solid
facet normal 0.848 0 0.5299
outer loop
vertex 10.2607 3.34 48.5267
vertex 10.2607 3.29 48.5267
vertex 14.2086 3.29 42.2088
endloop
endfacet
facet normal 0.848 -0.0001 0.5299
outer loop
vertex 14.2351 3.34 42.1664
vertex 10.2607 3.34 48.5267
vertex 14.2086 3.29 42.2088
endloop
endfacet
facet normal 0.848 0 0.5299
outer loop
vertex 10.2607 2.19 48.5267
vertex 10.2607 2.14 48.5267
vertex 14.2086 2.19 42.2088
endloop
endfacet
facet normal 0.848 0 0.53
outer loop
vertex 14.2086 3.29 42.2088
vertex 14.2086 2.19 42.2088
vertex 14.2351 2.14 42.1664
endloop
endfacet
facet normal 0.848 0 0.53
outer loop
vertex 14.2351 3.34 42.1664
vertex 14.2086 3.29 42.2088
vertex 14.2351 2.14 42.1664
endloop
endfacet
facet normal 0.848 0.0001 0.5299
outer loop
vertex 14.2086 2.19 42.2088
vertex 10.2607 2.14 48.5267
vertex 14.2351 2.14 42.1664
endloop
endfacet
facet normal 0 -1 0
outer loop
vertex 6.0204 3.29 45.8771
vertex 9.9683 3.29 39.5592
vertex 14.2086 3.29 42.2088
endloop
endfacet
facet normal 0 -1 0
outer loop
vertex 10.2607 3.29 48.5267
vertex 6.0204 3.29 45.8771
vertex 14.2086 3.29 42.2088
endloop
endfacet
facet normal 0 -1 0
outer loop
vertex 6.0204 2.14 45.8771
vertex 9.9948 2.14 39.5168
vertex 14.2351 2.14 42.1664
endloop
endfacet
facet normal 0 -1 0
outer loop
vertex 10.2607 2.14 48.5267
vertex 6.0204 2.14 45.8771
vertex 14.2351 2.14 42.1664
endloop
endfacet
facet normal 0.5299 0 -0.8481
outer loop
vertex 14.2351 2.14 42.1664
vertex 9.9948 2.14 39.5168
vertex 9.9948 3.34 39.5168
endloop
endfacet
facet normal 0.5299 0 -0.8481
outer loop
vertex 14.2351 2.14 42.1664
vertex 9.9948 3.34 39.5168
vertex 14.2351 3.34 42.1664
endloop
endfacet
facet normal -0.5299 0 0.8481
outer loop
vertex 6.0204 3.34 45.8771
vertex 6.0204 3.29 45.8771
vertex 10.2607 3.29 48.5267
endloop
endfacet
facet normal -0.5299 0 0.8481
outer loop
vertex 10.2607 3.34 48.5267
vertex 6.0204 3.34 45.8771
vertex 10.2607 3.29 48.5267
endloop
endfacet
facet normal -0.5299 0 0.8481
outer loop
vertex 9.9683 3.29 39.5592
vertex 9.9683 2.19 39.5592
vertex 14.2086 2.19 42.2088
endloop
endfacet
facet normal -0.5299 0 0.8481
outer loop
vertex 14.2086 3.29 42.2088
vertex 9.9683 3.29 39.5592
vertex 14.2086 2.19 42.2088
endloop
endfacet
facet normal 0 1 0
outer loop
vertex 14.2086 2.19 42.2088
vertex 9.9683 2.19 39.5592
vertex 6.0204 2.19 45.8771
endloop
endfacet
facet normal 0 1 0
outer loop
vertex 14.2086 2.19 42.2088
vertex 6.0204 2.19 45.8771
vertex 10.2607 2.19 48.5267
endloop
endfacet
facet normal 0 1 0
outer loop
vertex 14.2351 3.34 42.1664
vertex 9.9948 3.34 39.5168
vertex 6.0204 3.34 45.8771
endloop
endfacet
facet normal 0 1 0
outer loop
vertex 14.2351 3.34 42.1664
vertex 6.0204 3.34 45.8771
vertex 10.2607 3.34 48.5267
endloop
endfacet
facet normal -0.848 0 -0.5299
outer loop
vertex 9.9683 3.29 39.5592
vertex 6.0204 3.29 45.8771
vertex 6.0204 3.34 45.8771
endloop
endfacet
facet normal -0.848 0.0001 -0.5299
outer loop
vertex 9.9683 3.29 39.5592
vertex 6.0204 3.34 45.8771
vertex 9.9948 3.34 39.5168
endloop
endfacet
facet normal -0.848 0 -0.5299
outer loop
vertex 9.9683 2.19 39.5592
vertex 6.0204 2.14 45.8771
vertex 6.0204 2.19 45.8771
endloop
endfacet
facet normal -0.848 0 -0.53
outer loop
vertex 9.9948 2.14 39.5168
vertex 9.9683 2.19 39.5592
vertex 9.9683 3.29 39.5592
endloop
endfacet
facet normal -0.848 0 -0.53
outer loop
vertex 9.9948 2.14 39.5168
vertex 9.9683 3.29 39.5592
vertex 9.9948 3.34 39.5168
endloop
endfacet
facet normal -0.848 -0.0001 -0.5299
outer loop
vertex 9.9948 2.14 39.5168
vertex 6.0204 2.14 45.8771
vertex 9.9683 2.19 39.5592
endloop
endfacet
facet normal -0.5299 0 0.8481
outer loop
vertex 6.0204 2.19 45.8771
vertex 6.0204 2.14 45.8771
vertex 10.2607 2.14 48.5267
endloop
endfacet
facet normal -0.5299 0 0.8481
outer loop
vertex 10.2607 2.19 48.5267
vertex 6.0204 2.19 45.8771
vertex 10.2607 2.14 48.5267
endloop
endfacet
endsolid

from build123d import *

# Parameters (mm, degrees)
BOX161_W           = 5
BOX161_H           = 7.45
BOX161_DEPTH       = 1.1
BOX160_W           = 5
BOX160_H           = 7.5
BOX160_DEPTH       = 1.2
CUT078_ROLL_ANGLE  = -90
CUT078_PITCH_ANGLE = -32


with BuildPart() as small_cu_gnd_electrode066:
    # Box161 → Box161 (new body)
    with BuildSketch(Plane.XY.offset(0.05)):
        with Locations((2.5, 3.725)):
            Rectangle(BOX161_W, BOX161_H)
    extrude(amount=BOX161_DEPTH)


with BuildPart() as small_cu_electrode001_long_axis_v007:
    # Box160 → Box160 (new body)
    with BuildSketch(Plane.XY):
        with Locations((2.5, 3.75)):
            Rectangle(BOX160_W, BOX160_H)
    extrude(amount=BOX160_DEPTH)

    # Cut078: cut Small Cu GND Electrode066
    add(small_cu_gnd_electrode066.part, mode=Mode.SUBTRACT)


with BuildPart() as small_cu_electrode001_long_axis_v007_1:
    # Cut078 roll: moved
    add(small_cu_electrode001_long_axis_v007.part.rotate(Axis((0, 0, 0), (1, 0, 0)), CUT078_ROLL_ANGLE))


with BuildPart() as small_cu_electrode001_long_axis_v007_2:
    # Cut078 pitch: moved
    add(small_cu_electrode001_long_axis_v007_1.part.rotate(Axis((0, 0, 0), (0, 1, 0)), CUT078_PITCH_ANGLE))


with BuildPart() as small_cu_electrode001_long_axis_v007_3:
    # Cut078 placement: moved
    add(small_cu_electrode001_long_axis_v007_2.part.moved(Location((6.020438, 2.14, 45.877147))))


solid = small_cu_electrode001_long_axis_v007_3.part
